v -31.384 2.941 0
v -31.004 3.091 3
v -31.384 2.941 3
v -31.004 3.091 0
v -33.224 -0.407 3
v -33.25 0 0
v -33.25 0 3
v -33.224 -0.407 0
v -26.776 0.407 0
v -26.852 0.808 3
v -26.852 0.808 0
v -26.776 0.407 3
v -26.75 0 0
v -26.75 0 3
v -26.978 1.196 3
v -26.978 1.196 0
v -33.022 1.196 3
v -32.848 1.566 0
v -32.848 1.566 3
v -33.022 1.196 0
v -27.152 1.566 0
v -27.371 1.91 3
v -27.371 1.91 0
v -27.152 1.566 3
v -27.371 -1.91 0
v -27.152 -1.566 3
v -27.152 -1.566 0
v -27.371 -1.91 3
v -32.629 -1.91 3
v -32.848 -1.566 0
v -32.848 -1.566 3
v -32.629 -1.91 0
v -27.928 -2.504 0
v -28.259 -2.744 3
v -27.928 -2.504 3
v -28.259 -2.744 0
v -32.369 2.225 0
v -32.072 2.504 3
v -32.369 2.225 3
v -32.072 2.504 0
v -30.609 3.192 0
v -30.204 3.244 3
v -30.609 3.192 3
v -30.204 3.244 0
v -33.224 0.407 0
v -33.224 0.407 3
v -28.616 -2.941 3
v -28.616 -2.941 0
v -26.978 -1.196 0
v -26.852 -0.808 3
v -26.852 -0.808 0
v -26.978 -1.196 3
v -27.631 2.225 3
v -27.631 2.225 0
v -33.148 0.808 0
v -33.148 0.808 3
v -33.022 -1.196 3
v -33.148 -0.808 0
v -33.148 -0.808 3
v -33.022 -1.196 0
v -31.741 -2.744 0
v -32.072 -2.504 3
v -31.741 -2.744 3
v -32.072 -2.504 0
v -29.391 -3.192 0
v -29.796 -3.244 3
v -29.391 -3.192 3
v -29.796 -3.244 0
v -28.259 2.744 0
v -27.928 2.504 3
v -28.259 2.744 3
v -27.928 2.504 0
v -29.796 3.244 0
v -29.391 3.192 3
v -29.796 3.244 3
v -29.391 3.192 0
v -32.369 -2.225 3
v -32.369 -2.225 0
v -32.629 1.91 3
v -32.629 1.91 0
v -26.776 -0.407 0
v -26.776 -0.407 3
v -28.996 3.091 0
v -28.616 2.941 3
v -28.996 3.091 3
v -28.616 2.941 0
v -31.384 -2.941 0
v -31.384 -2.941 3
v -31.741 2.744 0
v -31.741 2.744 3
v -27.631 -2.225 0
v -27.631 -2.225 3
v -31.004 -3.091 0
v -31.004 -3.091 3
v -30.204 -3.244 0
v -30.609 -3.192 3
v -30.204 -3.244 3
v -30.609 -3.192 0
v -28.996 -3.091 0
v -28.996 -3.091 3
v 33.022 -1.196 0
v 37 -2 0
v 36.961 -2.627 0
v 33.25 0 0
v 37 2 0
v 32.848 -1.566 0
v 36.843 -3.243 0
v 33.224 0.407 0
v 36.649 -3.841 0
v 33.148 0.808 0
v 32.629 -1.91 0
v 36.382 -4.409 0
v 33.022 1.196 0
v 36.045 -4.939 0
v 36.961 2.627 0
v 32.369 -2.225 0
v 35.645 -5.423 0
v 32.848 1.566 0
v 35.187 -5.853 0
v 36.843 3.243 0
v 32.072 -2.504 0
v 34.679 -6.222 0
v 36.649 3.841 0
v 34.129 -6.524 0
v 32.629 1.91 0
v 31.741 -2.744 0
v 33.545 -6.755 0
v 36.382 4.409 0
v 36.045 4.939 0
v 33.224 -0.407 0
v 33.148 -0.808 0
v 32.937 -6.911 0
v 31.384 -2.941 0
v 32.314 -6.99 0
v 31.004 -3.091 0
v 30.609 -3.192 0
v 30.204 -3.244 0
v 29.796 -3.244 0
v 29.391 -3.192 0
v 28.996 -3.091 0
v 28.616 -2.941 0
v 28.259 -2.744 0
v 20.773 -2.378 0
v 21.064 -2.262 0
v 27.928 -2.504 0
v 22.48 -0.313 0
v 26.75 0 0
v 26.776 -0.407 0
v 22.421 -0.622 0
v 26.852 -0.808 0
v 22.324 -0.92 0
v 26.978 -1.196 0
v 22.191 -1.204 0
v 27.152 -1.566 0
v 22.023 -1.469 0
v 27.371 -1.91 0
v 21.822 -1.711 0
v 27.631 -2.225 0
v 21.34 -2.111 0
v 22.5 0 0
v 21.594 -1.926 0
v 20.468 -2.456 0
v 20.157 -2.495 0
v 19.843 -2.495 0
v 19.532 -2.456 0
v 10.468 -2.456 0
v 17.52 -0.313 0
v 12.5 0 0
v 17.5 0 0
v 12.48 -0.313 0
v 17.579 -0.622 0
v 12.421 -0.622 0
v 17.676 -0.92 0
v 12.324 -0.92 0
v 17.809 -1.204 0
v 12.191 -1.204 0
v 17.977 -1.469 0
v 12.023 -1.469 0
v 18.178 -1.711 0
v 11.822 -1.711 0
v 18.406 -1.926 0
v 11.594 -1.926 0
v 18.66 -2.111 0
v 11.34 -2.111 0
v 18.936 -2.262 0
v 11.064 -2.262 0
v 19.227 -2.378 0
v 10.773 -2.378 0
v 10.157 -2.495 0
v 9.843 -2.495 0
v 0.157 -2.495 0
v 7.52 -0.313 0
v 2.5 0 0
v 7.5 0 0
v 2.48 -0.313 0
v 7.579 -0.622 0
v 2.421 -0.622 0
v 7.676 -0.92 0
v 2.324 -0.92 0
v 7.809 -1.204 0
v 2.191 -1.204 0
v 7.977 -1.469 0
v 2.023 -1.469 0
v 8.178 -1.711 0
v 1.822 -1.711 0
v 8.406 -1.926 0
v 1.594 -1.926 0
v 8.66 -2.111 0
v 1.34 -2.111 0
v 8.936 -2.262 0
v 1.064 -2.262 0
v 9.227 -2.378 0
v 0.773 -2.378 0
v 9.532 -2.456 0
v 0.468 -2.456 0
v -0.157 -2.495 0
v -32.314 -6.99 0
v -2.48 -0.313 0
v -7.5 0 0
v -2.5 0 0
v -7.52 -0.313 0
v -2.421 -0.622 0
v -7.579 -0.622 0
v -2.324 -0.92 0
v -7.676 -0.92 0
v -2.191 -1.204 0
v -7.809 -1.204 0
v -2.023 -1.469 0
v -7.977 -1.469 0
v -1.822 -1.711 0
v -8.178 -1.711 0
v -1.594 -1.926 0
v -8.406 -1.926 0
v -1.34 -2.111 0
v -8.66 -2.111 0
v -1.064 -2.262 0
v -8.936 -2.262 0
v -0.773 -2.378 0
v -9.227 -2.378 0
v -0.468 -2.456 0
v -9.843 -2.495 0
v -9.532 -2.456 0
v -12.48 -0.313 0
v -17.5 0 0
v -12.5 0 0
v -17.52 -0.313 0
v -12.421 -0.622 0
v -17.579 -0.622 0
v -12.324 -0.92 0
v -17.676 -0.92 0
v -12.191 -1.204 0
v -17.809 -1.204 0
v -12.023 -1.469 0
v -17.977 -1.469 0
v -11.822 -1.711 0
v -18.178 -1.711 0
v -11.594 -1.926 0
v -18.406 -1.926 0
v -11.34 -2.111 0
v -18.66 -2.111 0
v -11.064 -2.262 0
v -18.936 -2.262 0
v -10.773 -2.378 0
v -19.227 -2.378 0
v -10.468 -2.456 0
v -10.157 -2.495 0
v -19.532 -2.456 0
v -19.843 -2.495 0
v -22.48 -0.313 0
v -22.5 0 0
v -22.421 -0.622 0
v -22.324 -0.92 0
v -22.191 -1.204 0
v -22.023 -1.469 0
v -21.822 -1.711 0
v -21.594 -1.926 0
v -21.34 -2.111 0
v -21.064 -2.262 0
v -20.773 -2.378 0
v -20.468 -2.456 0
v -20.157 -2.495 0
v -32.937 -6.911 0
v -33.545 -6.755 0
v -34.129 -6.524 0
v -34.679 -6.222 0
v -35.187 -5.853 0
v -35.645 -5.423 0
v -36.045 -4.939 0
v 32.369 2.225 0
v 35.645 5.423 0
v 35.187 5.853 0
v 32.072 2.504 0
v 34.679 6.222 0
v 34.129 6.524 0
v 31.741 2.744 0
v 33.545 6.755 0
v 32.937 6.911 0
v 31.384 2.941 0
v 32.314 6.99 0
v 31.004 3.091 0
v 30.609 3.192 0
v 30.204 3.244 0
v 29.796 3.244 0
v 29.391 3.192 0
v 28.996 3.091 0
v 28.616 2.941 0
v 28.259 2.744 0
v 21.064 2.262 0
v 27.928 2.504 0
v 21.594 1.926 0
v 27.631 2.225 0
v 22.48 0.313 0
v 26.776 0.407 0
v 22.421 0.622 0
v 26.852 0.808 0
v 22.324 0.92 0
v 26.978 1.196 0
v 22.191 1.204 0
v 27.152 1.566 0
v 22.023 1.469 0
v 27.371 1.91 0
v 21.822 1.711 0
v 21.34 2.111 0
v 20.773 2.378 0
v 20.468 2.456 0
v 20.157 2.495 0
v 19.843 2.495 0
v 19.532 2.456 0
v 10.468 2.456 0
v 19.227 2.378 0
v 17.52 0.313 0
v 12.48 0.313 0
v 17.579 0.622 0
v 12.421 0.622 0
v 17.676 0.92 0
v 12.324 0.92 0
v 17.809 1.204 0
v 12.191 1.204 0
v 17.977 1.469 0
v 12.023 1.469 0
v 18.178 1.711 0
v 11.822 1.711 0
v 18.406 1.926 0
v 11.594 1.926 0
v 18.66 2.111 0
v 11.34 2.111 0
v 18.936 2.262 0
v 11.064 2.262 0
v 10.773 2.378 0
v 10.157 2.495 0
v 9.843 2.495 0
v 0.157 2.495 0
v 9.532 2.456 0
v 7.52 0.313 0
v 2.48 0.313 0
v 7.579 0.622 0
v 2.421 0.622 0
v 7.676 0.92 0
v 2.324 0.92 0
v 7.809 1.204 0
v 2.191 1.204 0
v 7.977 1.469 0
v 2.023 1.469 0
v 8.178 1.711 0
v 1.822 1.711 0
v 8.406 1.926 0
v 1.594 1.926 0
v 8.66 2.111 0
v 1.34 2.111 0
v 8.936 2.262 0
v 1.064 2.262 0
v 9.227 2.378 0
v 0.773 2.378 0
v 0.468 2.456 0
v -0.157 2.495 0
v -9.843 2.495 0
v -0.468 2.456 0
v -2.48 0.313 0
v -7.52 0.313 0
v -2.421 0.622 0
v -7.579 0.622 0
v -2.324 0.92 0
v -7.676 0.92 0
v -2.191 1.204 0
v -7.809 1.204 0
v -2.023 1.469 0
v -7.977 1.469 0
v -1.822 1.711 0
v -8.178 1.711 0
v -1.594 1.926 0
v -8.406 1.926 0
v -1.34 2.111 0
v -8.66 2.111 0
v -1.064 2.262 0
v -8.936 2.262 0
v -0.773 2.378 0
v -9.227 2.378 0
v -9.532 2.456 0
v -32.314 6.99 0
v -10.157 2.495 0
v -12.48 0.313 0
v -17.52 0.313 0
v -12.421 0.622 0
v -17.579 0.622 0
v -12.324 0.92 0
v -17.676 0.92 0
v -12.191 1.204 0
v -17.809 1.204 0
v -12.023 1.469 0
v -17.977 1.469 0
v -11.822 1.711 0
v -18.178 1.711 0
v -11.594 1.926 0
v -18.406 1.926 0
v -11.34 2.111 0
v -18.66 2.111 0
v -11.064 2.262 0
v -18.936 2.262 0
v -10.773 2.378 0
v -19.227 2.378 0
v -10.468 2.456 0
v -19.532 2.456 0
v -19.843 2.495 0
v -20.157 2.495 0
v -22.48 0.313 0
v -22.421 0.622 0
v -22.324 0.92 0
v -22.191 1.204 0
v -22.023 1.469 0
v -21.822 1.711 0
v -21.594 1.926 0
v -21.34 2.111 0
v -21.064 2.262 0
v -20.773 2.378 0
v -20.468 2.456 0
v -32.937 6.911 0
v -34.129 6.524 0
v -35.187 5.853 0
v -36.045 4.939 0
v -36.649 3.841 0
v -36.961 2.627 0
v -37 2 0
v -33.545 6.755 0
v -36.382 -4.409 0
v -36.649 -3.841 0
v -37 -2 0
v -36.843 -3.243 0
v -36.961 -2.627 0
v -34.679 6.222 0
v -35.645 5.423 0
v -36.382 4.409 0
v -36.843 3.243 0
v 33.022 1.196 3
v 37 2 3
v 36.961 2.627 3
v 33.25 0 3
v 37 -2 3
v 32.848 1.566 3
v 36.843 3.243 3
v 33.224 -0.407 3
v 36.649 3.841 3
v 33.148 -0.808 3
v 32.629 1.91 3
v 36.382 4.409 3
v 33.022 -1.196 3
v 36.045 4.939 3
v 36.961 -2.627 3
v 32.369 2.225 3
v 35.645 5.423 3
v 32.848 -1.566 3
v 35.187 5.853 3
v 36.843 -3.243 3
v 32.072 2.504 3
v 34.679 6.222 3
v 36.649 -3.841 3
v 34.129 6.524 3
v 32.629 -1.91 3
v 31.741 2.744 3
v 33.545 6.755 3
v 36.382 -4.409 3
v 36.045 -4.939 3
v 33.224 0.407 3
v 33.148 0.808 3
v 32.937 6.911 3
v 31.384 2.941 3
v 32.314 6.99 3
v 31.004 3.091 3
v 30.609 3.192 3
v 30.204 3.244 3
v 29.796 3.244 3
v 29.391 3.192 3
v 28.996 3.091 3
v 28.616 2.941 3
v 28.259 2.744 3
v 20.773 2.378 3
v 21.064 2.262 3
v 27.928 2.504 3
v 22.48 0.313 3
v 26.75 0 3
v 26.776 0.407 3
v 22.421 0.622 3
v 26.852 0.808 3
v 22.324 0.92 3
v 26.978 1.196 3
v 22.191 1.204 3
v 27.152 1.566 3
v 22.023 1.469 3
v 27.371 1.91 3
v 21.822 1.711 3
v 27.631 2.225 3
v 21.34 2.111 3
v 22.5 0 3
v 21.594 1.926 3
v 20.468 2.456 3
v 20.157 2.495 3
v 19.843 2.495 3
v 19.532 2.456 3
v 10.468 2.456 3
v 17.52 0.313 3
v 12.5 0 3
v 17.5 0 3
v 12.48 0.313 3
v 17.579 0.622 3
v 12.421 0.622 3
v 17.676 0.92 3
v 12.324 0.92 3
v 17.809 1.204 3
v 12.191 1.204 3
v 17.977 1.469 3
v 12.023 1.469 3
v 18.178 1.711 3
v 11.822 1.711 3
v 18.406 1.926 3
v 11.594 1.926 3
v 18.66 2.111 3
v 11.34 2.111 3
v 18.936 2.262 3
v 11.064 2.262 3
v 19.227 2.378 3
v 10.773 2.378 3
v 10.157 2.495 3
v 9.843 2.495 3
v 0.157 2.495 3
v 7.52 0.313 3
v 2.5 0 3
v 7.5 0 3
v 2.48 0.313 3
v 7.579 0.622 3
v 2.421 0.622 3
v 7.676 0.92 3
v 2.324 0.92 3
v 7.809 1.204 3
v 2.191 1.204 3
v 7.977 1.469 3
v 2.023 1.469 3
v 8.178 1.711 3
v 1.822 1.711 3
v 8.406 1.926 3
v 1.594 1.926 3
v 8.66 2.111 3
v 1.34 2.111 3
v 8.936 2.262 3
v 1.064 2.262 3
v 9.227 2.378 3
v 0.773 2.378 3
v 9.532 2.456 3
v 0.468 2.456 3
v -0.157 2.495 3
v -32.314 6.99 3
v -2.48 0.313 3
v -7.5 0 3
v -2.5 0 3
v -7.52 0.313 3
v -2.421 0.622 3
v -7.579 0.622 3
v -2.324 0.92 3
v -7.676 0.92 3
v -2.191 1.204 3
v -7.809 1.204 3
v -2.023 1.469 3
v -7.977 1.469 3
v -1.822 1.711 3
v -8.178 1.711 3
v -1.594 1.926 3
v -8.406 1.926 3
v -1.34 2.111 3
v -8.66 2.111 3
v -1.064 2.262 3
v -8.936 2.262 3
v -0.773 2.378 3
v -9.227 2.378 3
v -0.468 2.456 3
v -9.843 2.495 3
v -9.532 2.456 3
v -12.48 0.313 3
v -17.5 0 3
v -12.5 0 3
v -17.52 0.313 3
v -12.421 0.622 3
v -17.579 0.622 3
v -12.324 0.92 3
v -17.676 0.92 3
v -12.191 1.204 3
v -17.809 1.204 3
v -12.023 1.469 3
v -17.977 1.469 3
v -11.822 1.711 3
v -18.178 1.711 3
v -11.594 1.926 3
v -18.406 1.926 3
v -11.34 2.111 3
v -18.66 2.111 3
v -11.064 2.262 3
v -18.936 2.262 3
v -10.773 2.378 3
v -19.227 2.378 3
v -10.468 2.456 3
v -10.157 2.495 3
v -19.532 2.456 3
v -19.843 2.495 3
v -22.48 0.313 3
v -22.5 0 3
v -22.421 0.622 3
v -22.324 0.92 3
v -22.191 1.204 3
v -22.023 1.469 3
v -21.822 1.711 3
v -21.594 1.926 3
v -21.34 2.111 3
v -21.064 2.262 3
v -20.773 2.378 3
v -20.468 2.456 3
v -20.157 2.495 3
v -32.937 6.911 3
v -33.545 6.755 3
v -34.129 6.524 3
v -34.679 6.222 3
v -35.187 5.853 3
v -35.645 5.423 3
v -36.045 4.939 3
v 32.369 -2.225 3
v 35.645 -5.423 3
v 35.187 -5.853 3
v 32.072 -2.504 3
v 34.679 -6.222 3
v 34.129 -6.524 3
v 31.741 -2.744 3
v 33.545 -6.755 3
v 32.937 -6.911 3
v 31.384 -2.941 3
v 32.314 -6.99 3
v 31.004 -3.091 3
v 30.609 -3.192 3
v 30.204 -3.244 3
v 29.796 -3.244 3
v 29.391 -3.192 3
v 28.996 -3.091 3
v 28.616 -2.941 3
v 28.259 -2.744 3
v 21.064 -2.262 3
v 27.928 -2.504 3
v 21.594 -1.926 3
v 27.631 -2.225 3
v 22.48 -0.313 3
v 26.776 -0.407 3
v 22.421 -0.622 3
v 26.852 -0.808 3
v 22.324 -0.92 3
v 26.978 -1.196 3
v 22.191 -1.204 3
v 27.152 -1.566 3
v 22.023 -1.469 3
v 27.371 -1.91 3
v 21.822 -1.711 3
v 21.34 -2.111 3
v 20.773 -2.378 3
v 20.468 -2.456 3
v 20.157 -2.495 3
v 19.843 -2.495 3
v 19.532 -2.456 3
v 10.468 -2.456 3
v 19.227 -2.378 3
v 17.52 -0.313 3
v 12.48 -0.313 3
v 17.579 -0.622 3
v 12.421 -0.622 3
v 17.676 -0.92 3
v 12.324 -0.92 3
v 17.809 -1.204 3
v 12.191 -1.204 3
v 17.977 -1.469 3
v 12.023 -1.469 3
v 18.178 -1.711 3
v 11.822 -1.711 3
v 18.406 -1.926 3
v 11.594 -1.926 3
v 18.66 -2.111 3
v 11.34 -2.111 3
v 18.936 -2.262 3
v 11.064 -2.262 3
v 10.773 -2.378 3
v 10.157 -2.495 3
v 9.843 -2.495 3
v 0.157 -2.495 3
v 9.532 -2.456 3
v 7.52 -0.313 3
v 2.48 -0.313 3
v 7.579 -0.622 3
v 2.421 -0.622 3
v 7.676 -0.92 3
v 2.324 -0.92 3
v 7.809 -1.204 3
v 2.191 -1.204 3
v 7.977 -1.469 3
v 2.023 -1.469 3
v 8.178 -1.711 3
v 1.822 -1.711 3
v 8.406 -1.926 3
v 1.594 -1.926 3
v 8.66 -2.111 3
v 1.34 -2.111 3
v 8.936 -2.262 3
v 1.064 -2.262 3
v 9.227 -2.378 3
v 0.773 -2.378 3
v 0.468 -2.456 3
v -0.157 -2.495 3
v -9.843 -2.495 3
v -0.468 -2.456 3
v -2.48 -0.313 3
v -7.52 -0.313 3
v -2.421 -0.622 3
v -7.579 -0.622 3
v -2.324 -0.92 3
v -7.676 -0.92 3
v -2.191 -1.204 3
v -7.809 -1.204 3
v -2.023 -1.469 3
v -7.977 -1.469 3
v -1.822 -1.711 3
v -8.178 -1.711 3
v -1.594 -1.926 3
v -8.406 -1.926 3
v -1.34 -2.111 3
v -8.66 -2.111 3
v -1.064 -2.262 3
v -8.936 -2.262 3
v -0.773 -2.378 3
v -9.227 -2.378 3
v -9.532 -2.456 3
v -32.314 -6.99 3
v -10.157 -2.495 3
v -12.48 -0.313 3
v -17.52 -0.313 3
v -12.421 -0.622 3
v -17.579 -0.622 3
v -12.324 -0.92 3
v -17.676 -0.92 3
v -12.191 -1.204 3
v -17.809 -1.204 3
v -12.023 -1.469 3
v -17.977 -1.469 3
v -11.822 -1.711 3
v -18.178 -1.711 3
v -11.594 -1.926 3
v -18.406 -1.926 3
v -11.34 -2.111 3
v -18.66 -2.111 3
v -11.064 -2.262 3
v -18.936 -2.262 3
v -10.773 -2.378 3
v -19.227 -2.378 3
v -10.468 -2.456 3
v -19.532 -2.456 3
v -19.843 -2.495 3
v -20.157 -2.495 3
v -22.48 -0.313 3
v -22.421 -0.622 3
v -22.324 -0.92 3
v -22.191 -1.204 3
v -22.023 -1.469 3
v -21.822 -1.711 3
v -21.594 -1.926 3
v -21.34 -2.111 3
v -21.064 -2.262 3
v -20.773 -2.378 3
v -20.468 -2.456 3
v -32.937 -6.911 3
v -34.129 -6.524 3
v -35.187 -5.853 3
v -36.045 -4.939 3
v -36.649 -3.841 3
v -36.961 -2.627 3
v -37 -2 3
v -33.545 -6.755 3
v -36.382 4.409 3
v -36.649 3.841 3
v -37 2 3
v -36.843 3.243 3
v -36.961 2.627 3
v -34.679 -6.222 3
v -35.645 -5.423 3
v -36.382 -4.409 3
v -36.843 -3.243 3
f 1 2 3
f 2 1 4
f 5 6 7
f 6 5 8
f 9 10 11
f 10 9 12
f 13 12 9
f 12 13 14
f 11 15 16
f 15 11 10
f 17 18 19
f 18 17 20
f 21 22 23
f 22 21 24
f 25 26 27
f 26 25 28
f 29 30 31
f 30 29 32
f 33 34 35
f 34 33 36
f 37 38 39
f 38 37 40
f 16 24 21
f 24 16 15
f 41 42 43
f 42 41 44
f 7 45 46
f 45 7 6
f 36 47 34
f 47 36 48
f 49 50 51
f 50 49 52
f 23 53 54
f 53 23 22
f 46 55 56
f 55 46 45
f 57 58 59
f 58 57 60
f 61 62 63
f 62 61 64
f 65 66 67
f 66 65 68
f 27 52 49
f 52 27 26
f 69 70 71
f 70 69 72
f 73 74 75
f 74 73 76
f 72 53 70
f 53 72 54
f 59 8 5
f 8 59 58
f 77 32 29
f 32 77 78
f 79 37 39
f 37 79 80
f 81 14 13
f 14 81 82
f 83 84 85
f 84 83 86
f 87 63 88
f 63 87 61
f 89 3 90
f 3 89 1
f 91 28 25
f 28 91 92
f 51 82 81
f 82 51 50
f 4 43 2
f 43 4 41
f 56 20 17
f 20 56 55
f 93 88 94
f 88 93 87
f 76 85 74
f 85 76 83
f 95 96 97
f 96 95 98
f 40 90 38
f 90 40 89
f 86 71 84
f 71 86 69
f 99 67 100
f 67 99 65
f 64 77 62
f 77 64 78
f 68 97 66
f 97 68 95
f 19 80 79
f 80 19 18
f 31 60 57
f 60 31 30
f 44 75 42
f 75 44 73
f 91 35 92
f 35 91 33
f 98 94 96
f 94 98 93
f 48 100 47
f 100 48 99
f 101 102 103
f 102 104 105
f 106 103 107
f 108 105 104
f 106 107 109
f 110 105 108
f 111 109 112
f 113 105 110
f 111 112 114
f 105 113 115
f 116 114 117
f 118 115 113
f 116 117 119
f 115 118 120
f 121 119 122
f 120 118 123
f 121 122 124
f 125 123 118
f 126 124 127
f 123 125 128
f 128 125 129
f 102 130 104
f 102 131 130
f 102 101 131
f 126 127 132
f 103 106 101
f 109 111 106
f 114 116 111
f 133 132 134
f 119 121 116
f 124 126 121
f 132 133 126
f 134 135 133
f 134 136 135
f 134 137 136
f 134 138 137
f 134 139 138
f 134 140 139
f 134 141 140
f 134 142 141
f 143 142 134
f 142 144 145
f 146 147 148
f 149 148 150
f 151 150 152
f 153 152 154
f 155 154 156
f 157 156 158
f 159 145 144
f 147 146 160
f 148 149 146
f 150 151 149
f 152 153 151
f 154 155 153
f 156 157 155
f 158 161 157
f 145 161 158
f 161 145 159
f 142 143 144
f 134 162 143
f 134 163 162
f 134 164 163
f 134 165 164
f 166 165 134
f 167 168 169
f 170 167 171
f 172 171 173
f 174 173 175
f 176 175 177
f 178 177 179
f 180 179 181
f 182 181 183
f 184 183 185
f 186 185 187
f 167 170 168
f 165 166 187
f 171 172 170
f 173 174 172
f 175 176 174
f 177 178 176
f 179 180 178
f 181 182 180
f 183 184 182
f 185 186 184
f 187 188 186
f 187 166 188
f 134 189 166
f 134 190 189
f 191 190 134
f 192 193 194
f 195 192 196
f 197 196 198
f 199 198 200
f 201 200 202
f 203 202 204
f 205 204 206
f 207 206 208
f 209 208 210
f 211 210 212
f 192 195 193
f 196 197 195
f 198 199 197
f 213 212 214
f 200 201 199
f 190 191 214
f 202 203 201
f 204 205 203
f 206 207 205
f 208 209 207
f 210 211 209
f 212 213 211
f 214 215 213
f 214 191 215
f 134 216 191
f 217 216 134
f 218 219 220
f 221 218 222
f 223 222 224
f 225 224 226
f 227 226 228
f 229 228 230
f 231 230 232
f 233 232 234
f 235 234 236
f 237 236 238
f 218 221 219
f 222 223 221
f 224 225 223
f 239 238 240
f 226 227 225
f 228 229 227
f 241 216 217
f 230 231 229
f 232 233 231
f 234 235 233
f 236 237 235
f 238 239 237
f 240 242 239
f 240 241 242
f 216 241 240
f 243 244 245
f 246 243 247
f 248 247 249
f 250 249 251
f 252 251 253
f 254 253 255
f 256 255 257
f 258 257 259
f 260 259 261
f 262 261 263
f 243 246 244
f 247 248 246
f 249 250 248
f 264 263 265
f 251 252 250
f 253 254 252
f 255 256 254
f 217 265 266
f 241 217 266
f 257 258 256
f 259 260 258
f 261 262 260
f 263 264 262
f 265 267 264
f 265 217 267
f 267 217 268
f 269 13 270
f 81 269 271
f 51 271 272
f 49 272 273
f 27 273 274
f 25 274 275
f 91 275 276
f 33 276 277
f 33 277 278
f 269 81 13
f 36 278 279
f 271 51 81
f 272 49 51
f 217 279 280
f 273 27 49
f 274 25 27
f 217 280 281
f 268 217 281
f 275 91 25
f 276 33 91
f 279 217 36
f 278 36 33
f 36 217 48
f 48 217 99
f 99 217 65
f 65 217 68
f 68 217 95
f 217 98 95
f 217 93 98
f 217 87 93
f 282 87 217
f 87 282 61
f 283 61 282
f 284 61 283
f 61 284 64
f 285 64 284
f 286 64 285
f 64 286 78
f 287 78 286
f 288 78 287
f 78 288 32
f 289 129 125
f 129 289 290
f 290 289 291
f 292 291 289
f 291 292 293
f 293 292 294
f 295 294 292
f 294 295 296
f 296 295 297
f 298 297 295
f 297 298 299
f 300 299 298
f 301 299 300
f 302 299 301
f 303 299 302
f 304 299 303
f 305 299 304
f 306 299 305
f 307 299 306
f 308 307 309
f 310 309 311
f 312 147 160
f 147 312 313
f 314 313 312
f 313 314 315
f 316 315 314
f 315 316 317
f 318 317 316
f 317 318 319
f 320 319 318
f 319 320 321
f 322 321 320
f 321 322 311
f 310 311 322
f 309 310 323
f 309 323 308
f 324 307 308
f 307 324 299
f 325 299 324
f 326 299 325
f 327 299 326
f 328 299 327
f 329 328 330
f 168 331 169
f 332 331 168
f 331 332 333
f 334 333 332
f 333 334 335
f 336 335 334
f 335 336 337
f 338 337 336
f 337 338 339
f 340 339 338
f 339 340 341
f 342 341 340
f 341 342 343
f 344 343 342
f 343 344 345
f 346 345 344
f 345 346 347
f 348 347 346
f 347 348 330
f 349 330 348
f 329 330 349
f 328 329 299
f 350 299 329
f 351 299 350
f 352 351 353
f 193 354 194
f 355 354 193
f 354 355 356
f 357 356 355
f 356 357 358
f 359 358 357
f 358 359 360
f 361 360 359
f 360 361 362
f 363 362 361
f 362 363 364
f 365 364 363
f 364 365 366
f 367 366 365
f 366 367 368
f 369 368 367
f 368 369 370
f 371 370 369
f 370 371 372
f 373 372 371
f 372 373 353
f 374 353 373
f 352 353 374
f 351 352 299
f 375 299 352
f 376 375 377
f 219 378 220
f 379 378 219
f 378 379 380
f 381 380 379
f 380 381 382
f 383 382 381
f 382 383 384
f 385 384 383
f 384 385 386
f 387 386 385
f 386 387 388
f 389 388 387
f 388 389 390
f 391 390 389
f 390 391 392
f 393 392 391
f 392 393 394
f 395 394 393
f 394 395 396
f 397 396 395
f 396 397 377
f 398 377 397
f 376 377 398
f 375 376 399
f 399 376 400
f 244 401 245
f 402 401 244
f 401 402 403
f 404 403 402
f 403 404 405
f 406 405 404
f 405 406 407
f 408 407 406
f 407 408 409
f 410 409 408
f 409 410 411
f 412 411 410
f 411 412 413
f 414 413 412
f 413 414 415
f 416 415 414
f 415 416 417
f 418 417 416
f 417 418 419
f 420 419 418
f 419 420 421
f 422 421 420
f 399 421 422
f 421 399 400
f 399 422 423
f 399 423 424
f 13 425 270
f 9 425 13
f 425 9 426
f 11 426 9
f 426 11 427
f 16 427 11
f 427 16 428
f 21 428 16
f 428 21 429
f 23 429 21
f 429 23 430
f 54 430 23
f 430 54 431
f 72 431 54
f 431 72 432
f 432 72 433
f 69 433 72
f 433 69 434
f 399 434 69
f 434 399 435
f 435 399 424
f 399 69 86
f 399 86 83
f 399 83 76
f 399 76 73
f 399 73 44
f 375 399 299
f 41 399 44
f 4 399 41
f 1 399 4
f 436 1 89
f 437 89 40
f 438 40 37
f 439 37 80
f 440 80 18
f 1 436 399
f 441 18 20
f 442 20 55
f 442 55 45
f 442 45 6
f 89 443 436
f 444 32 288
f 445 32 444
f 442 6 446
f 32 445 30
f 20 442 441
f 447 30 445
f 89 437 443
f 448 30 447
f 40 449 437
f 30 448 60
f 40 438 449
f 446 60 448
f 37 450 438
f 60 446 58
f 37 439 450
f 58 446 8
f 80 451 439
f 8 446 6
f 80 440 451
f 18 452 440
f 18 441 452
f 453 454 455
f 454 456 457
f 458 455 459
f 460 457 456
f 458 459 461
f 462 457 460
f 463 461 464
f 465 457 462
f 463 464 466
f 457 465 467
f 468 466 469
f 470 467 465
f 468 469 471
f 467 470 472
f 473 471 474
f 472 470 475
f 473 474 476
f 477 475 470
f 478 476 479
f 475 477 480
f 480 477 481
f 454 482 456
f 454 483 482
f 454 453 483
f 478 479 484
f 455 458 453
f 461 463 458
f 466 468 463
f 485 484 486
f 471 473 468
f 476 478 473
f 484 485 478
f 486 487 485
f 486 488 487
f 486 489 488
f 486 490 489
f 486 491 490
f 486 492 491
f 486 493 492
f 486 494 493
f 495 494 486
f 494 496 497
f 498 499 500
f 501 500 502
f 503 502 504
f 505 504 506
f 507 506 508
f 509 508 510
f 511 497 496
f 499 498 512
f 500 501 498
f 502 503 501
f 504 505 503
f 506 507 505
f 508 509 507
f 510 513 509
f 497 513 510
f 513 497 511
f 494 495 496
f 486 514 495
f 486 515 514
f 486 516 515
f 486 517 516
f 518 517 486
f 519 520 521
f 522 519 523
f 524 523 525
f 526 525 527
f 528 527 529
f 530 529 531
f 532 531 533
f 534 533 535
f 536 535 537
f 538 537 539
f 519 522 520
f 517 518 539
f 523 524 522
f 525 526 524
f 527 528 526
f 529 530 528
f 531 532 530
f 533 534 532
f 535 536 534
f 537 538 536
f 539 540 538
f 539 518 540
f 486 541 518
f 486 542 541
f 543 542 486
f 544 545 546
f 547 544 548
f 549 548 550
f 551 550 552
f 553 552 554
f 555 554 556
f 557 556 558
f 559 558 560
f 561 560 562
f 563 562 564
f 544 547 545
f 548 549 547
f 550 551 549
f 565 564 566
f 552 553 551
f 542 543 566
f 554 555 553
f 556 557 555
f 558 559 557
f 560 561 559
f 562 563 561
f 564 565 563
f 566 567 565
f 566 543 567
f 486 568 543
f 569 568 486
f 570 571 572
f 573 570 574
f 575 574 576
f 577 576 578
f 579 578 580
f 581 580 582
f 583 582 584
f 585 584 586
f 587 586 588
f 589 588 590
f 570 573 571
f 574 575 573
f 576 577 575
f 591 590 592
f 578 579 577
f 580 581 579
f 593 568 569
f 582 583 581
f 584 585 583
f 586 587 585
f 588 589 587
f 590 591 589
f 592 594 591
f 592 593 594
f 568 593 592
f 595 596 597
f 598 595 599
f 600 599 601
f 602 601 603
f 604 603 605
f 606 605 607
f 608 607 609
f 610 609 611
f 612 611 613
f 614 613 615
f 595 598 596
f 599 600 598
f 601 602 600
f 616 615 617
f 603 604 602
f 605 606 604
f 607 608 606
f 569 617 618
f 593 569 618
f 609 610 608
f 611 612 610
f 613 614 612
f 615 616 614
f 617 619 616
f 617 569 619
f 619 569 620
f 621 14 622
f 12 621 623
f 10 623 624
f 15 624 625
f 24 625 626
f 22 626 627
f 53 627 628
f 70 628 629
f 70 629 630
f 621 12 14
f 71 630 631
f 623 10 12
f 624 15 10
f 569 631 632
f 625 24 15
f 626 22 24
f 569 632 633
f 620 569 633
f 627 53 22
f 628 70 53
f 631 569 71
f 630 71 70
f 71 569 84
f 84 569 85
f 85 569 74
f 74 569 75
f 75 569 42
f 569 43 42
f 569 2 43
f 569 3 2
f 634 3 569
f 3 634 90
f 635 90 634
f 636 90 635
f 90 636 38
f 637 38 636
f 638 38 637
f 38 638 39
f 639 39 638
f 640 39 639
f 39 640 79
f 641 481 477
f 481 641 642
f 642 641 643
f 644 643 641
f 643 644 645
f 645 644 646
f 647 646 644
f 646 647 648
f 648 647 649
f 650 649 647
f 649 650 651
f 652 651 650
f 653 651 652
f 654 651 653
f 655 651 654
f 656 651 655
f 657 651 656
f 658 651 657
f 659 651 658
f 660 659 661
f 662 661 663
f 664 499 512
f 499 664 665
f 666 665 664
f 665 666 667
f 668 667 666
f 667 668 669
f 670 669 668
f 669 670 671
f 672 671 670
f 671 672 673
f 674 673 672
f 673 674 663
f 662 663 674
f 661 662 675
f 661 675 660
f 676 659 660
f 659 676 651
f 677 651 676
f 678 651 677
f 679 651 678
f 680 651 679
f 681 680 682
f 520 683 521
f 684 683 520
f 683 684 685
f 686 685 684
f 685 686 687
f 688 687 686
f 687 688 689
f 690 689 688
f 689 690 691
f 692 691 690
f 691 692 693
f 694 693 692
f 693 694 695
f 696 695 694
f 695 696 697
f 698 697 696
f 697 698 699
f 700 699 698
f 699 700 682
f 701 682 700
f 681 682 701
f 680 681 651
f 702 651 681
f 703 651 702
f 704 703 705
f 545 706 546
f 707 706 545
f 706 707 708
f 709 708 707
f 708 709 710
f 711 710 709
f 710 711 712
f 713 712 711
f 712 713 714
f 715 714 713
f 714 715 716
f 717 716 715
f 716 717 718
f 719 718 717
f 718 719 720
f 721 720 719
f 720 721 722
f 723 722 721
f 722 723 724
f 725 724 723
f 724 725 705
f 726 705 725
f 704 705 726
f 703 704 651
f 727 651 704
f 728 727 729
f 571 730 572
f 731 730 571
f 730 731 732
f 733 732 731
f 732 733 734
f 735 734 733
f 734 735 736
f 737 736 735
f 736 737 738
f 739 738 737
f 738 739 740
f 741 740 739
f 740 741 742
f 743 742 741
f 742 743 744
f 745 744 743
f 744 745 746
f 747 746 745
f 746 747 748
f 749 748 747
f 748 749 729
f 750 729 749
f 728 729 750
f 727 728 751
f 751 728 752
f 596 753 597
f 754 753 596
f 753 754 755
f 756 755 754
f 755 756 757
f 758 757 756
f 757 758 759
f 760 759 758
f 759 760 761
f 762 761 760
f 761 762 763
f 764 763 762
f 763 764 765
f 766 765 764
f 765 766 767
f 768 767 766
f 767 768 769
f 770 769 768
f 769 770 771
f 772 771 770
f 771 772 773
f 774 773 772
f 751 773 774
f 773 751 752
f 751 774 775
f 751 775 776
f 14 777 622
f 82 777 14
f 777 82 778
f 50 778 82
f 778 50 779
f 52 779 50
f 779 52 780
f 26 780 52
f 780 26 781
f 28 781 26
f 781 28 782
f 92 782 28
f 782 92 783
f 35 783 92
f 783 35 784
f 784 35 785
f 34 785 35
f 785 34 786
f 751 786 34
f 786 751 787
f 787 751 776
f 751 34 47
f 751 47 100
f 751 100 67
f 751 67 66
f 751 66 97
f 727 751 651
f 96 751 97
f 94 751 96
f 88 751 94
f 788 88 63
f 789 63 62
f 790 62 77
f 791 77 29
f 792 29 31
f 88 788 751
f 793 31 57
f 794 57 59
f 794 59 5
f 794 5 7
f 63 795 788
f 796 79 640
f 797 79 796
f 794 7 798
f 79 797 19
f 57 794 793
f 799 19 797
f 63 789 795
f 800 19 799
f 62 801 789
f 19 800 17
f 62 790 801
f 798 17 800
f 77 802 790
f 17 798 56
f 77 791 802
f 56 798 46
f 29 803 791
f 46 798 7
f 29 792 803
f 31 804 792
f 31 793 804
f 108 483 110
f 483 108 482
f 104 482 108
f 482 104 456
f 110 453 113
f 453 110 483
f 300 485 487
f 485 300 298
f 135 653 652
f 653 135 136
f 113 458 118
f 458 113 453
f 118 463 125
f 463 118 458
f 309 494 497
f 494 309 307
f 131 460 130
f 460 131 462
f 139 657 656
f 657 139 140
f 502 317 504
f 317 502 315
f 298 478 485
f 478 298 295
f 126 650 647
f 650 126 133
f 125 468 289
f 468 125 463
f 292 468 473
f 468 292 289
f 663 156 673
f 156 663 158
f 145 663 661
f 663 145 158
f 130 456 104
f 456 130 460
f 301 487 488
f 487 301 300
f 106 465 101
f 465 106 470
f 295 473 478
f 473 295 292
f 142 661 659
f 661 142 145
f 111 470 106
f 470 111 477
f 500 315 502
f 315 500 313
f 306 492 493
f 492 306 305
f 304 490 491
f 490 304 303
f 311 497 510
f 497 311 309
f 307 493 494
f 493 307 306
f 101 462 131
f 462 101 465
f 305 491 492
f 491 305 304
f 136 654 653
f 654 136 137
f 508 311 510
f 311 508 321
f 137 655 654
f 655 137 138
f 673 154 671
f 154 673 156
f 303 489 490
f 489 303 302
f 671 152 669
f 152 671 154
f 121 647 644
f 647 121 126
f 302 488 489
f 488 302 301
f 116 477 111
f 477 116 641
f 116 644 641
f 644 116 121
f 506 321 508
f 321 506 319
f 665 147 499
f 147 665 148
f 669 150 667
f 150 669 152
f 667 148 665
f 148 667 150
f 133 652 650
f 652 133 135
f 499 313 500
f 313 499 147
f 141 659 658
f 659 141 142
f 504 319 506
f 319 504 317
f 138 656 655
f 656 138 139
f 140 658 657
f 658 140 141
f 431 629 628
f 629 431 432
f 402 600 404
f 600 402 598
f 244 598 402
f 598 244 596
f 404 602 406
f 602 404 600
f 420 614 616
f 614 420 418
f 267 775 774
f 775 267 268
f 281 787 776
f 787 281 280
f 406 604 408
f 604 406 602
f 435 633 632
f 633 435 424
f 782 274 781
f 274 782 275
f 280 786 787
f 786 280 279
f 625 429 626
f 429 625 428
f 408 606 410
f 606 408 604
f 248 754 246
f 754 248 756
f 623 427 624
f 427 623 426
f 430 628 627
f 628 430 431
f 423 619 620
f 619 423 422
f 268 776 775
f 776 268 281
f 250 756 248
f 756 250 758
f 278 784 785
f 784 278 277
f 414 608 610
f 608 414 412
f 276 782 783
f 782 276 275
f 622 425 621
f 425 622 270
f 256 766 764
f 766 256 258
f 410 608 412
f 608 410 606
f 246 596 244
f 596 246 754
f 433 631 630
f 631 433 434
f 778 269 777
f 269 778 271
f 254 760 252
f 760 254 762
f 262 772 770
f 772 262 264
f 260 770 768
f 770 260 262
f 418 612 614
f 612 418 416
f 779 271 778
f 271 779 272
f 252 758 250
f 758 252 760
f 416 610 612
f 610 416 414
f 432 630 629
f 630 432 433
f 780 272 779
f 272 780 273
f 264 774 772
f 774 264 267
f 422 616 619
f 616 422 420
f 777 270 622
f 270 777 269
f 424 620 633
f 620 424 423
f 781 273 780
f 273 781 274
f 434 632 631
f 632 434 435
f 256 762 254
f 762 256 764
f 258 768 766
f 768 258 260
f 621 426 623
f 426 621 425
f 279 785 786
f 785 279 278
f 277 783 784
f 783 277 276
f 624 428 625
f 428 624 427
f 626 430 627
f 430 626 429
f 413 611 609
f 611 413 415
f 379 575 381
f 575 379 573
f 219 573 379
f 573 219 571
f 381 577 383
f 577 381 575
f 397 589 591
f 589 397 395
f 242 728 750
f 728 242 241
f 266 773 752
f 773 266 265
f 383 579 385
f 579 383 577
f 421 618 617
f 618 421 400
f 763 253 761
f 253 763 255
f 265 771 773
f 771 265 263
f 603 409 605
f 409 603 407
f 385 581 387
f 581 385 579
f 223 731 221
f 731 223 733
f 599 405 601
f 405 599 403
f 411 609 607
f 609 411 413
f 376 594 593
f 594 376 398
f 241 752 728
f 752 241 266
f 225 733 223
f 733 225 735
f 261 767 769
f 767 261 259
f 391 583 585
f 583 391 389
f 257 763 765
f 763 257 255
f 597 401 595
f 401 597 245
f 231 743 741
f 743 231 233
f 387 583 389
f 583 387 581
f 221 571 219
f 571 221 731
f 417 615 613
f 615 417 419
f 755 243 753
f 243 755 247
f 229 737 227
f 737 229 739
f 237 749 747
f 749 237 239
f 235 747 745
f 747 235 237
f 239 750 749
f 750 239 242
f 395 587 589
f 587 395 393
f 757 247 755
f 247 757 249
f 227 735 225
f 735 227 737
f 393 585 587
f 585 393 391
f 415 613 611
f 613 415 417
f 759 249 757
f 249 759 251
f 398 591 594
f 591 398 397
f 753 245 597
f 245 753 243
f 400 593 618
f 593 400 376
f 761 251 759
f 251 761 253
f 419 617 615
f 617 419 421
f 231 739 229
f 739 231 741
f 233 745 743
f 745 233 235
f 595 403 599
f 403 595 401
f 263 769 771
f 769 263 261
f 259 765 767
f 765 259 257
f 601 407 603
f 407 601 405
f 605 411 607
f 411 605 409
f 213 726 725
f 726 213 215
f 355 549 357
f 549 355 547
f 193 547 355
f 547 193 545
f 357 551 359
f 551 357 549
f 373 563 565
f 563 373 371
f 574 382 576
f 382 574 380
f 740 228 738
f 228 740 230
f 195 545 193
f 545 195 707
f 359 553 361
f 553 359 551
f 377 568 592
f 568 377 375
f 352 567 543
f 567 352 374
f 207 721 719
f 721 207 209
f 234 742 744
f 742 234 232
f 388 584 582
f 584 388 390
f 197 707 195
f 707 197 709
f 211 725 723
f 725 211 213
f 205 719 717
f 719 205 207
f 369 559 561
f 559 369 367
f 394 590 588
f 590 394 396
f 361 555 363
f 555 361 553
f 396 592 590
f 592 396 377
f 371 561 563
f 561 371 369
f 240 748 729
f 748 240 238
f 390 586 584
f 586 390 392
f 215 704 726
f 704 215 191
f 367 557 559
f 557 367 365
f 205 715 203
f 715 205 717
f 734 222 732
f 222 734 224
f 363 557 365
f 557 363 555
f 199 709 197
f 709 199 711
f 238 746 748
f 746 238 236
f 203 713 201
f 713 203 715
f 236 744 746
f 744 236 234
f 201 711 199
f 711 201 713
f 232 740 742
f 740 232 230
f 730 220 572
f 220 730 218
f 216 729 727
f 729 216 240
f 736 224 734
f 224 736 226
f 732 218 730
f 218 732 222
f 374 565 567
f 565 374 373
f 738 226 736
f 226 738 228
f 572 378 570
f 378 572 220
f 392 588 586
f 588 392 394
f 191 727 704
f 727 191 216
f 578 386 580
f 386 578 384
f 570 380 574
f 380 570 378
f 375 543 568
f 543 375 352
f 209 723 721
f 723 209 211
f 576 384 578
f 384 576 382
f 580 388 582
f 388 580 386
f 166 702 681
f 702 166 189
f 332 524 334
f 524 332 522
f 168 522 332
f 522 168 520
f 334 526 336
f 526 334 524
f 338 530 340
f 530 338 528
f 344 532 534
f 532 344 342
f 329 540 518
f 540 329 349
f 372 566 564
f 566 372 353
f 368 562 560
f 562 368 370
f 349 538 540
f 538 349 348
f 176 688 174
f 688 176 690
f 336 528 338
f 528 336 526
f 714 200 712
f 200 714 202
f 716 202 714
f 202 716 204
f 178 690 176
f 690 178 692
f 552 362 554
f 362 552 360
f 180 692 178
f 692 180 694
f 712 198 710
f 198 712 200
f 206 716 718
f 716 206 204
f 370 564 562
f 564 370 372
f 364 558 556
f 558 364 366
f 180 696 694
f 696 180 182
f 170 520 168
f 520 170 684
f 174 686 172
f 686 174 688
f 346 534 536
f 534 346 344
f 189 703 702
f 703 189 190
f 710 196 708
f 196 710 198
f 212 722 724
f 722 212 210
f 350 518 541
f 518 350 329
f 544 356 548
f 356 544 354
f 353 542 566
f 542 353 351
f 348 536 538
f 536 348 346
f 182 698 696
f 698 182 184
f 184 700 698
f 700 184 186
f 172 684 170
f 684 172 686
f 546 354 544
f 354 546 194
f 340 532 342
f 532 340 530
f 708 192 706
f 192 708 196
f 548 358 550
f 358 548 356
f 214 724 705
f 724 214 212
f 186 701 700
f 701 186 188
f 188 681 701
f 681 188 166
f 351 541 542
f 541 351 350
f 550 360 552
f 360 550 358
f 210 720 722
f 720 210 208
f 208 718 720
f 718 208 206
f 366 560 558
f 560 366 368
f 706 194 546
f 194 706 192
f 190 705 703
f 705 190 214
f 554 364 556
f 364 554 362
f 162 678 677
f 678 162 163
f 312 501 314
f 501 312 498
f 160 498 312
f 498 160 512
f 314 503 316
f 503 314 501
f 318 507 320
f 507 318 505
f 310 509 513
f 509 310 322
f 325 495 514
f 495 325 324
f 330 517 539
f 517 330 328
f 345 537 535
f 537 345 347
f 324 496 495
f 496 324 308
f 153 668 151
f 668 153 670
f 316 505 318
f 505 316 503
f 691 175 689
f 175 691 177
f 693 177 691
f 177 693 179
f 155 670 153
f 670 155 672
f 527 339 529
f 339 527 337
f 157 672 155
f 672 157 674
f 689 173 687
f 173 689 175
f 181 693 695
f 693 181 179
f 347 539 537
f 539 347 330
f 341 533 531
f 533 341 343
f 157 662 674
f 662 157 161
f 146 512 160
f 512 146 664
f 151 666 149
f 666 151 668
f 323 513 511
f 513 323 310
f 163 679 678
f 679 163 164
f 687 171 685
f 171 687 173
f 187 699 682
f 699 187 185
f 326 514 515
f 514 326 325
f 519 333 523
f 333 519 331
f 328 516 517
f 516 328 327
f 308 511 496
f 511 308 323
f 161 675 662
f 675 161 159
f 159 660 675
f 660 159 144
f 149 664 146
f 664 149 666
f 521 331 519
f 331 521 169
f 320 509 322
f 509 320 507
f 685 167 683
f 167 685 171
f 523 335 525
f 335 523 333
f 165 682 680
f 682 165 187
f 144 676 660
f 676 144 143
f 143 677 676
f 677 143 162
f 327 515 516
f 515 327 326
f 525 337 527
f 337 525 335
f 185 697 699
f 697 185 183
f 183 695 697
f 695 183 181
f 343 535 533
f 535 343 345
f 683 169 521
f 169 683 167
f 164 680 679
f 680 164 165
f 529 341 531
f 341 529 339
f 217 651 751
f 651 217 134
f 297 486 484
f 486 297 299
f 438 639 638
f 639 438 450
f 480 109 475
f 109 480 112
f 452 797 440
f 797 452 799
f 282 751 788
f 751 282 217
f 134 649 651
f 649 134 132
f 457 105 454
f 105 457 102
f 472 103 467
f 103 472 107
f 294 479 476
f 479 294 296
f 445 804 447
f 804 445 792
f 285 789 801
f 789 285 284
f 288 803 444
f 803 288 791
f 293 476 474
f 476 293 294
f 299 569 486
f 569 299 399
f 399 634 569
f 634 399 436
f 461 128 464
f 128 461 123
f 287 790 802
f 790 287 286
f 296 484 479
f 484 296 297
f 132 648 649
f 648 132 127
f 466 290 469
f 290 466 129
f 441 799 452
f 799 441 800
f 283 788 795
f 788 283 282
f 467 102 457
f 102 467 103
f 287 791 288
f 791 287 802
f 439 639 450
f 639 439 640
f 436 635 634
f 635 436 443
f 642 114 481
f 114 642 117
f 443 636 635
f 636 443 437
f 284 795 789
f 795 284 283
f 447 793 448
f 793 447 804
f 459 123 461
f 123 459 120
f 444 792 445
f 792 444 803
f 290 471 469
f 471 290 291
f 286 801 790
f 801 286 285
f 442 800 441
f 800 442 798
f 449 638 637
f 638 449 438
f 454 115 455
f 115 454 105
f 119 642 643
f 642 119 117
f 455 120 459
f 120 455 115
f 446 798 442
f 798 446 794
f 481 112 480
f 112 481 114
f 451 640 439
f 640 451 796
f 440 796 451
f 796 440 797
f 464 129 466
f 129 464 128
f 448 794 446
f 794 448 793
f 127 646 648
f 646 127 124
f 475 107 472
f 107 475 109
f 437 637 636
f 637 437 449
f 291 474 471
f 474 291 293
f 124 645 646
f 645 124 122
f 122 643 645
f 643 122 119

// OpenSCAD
$fn = 50;

difference() {
	union() {
		hull() {
			translate(v = [-32.0, 2.0, 0]) {
				cylinder(h = 3, r = 5);
			}
			translate(v = [32.0, 2.0, 0]) {
				cylinder(h = 3, r = 5);
			}
			translate(v = [-32.0, -2.0, 0]) {
				cylinder(h = 3, r = 5);
			}
			translate(v = [32.0, -2.0, 0]) {
				cylinder(h = 3, r = 5);
			}
		}
	}
	union() {
		translate(v = [-30.0, 0.0, 0]) {
			cylinder(h = 3, r = 3.25);
		}
		translate(v = [30.0, 0.0, 0]) {
			cylinder(h = 3, r = 3.25);
		}
		translate(v = [-20.0, 0, 0.0]) {
			cylinder(h = 3, r = 2.5);
		}
		translate(v = [-10.0, 0, 0.0]) {
			cylinder(h = 3, r = 2.5);
		}
		cylinder(h = 3, r = 2.5);
		translate(v = [10.0, 0, 0.0]) {
			cylinder(h = 3, r = 2.5);
		}
		translate(v = [20.0, 0, 0.0]) {
			cylinder(h = 3, r = 2.5);
		}
	}
}
